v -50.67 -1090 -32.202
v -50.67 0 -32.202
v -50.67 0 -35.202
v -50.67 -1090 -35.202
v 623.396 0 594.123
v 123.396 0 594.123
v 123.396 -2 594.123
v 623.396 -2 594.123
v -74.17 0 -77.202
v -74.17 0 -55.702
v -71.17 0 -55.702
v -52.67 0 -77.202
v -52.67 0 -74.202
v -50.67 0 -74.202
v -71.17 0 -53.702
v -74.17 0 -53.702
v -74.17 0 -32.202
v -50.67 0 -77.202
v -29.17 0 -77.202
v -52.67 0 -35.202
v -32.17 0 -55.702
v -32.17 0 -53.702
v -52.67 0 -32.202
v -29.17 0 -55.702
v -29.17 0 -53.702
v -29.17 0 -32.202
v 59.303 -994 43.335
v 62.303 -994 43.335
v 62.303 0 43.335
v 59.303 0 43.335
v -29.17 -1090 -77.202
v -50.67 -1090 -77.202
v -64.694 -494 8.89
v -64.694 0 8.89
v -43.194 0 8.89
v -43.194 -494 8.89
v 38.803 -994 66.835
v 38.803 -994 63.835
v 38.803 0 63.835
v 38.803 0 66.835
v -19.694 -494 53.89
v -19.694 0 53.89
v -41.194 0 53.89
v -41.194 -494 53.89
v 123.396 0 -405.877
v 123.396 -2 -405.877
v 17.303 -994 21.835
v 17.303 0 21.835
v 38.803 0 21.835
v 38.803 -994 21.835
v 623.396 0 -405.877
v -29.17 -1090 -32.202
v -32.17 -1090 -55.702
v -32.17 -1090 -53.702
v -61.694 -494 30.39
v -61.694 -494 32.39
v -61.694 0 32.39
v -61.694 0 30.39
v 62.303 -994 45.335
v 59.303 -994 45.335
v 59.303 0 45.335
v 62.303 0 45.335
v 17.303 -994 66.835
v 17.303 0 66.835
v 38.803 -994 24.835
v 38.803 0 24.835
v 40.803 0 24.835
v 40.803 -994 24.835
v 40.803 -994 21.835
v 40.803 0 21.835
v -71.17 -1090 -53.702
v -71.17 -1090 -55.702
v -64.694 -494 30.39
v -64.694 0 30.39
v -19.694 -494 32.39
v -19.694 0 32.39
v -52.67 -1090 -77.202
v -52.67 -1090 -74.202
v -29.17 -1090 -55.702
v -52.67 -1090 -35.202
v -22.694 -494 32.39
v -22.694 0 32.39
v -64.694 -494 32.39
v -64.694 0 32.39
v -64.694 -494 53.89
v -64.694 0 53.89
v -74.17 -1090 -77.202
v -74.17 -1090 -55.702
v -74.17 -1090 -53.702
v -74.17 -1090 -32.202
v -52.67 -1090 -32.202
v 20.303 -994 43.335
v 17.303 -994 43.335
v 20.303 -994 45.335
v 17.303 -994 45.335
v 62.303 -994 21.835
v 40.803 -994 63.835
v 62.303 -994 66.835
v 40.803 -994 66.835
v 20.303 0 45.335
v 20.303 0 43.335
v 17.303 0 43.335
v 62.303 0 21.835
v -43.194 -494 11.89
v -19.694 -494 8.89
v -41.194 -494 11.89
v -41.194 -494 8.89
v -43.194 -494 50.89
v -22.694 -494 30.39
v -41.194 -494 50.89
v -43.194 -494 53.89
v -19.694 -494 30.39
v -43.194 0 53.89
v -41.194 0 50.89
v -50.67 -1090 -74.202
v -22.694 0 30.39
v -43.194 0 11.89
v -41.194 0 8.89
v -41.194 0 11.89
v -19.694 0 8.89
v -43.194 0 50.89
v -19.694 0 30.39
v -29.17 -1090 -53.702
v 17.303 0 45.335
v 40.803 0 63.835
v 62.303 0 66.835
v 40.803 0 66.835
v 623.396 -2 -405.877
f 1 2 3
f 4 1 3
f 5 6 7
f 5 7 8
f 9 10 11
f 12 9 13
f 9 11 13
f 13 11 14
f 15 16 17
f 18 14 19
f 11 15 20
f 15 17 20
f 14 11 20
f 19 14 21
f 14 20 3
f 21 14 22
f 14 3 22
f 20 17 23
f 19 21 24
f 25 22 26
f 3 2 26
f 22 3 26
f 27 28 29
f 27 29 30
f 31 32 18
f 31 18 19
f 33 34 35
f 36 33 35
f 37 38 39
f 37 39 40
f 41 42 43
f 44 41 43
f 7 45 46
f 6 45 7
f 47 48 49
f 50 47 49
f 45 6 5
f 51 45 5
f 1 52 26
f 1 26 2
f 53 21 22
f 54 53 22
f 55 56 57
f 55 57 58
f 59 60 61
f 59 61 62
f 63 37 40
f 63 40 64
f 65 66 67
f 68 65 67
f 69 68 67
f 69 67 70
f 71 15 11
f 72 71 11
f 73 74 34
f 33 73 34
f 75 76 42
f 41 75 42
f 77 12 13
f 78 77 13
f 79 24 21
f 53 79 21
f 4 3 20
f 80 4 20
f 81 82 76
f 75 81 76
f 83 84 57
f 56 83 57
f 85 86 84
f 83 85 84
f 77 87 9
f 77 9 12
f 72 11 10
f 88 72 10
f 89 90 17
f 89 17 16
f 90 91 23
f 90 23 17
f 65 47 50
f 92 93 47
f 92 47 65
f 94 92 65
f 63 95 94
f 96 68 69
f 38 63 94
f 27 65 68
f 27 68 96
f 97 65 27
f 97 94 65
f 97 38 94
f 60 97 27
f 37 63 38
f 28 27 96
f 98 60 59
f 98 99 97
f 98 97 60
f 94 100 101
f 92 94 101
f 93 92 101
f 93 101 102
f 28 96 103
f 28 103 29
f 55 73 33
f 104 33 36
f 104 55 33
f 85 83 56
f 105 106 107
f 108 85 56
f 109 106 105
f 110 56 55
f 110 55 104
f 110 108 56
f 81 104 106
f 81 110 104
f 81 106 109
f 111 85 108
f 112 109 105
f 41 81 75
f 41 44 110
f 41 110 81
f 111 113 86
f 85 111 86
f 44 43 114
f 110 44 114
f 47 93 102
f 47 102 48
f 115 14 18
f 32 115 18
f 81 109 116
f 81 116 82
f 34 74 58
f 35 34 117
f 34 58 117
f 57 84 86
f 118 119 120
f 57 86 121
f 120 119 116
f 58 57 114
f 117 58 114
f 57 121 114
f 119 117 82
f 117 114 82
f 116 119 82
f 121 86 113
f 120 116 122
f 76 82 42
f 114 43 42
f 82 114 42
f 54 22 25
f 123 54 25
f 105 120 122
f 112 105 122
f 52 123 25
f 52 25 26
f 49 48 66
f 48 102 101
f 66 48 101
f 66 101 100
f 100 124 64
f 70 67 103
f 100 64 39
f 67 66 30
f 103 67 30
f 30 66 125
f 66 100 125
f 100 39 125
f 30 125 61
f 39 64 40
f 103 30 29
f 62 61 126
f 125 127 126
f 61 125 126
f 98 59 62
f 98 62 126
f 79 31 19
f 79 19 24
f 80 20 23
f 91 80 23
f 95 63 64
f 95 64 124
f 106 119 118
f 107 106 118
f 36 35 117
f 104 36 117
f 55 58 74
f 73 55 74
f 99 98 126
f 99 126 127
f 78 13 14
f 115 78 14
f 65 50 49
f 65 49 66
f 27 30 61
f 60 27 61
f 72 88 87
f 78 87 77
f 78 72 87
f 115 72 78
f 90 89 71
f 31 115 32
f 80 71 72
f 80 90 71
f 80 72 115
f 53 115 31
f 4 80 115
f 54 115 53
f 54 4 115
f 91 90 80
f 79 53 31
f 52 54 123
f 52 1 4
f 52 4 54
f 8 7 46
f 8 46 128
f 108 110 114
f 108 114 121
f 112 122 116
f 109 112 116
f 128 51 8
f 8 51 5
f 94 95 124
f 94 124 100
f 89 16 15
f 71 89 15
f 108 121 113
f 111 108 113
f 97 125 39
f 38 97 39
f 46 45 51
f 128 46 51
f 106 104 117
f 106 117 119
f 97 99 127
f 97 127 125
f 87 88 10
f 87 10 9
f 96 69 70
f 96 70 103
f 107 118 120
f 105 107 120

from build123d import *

# Parameters (mm, degrees)
F1_DEPTH = 494
F3_DEPTH = 1090
F4_W     = 500
F4_H     = 1000
F5_DEPTH = 2
F7_DEPTH = 994


with BuildPart() as f1:
    # F0 (on Front) → F1 (new body)
    with BuildSketch(Plane.XZ):
        Polygon((-43.193649, 53.889567), (-64.693649, 53.889567), (-64.693649, 32.389567), (-61.693649, 32.389567), (-61.693649, 31.389567), (-61.693649, 30.389567), (-64.693649, 30.389567), (-64.693649, 8.889567), (-43.193649, 8.889567), (-43.193649, 11.889567), (-42.193649, 11.889567), (-41.193649, 11.889567), (-41.193649, 8.889567), (-19.693649, 8.889567), (-19.693649, 30.389567), (-22.693649, 30.389567), (-22.693649, 31.389567), (-22.693649, 32.389567), (-19.693649, 32.389567), (-19.693649, 53.889567), (-41.193649, 53.889567), (-41.193649, 50.889567), (-42.193649, 50.889567), (-43.193649, 50.889567), align=None)
    extrude(amount=F1_DEPTH)


with BuildPart() as f3:
    # F2 (on Front) → F3 (new body)
    with BuildSketch(Plane.XZ):
        Polygon((-52.669517, -32.202289), (-74.169517, -32.202289), (-74.169517, -53.702289), (-71.169517, -53.702289), (-71.169517, -54.702289), (-71.169517, -55.702289), (-74.169517, -55.702289), (-74.169517, -77.202289), (-52.669517, -77.202289), (-52.669517, -74.202289), (-51.669517, -74.202289), (-50.669517, -74.202289), (-50.669517, -77.202289), (-29.169517, -77.202289), (-29.169517, -55.702289), (-32.169517, -55.702289), (-32.169517, -54.702289), (-32.169517, -53.702289), (-29.169517, -53.702289), (-29.169517, -32.202289), (-50.669517, -32.202289), (-50.669517, -35.202289), (-51.669517, -35.202289), (-52.669517, -35.202289), align=None)
    extrude(amount=F3_DEPTH)


with BuildPart() as f5:
    # F4 (on Front) → F5 (new body)
    with BuildSketch(Plane.XZ):
        with Locations((373.396269, 94.122896)):
            Rectangle(F4_W, F4_H)
    extrude(amount=F5_DEPTH)


with BuildPart() as f7:
    # F6 (on Front) → F7 (new body)
    with BuildSketch(Plane.XZ):
        Polygon((38.80347, 66.835272), (17.30347, 66.835272), (17.30347, 45.335272), (20.30347, 45.335272), (20.30347, 44.335272), (20.30347, 43.335272), (17.30347, 43.335272), (17.30347, 21.835272), (38.80347, 21.835272), (38.80347, 24.835272), (39.80347, 24.835272), (40.80347, 24.835272), (40.80347, 21.835272), (62.30347, 21.835272), (62.30347, 43.335272), (59.30347, 43.335272), (59.30347, 44.335272), (59.30347, 45.335272), (62.30347, 45.335272), (62.30347, 66.835272), (40.80347, 66.835272), (40.80347, 63.835272), (39.80347, 63.835272), (38.80347, 63.835272), align=None)
    extrude(amount=F7_DEPTH)


solid = Compound([f1.part, f3.part, f5.part, f7.part])
